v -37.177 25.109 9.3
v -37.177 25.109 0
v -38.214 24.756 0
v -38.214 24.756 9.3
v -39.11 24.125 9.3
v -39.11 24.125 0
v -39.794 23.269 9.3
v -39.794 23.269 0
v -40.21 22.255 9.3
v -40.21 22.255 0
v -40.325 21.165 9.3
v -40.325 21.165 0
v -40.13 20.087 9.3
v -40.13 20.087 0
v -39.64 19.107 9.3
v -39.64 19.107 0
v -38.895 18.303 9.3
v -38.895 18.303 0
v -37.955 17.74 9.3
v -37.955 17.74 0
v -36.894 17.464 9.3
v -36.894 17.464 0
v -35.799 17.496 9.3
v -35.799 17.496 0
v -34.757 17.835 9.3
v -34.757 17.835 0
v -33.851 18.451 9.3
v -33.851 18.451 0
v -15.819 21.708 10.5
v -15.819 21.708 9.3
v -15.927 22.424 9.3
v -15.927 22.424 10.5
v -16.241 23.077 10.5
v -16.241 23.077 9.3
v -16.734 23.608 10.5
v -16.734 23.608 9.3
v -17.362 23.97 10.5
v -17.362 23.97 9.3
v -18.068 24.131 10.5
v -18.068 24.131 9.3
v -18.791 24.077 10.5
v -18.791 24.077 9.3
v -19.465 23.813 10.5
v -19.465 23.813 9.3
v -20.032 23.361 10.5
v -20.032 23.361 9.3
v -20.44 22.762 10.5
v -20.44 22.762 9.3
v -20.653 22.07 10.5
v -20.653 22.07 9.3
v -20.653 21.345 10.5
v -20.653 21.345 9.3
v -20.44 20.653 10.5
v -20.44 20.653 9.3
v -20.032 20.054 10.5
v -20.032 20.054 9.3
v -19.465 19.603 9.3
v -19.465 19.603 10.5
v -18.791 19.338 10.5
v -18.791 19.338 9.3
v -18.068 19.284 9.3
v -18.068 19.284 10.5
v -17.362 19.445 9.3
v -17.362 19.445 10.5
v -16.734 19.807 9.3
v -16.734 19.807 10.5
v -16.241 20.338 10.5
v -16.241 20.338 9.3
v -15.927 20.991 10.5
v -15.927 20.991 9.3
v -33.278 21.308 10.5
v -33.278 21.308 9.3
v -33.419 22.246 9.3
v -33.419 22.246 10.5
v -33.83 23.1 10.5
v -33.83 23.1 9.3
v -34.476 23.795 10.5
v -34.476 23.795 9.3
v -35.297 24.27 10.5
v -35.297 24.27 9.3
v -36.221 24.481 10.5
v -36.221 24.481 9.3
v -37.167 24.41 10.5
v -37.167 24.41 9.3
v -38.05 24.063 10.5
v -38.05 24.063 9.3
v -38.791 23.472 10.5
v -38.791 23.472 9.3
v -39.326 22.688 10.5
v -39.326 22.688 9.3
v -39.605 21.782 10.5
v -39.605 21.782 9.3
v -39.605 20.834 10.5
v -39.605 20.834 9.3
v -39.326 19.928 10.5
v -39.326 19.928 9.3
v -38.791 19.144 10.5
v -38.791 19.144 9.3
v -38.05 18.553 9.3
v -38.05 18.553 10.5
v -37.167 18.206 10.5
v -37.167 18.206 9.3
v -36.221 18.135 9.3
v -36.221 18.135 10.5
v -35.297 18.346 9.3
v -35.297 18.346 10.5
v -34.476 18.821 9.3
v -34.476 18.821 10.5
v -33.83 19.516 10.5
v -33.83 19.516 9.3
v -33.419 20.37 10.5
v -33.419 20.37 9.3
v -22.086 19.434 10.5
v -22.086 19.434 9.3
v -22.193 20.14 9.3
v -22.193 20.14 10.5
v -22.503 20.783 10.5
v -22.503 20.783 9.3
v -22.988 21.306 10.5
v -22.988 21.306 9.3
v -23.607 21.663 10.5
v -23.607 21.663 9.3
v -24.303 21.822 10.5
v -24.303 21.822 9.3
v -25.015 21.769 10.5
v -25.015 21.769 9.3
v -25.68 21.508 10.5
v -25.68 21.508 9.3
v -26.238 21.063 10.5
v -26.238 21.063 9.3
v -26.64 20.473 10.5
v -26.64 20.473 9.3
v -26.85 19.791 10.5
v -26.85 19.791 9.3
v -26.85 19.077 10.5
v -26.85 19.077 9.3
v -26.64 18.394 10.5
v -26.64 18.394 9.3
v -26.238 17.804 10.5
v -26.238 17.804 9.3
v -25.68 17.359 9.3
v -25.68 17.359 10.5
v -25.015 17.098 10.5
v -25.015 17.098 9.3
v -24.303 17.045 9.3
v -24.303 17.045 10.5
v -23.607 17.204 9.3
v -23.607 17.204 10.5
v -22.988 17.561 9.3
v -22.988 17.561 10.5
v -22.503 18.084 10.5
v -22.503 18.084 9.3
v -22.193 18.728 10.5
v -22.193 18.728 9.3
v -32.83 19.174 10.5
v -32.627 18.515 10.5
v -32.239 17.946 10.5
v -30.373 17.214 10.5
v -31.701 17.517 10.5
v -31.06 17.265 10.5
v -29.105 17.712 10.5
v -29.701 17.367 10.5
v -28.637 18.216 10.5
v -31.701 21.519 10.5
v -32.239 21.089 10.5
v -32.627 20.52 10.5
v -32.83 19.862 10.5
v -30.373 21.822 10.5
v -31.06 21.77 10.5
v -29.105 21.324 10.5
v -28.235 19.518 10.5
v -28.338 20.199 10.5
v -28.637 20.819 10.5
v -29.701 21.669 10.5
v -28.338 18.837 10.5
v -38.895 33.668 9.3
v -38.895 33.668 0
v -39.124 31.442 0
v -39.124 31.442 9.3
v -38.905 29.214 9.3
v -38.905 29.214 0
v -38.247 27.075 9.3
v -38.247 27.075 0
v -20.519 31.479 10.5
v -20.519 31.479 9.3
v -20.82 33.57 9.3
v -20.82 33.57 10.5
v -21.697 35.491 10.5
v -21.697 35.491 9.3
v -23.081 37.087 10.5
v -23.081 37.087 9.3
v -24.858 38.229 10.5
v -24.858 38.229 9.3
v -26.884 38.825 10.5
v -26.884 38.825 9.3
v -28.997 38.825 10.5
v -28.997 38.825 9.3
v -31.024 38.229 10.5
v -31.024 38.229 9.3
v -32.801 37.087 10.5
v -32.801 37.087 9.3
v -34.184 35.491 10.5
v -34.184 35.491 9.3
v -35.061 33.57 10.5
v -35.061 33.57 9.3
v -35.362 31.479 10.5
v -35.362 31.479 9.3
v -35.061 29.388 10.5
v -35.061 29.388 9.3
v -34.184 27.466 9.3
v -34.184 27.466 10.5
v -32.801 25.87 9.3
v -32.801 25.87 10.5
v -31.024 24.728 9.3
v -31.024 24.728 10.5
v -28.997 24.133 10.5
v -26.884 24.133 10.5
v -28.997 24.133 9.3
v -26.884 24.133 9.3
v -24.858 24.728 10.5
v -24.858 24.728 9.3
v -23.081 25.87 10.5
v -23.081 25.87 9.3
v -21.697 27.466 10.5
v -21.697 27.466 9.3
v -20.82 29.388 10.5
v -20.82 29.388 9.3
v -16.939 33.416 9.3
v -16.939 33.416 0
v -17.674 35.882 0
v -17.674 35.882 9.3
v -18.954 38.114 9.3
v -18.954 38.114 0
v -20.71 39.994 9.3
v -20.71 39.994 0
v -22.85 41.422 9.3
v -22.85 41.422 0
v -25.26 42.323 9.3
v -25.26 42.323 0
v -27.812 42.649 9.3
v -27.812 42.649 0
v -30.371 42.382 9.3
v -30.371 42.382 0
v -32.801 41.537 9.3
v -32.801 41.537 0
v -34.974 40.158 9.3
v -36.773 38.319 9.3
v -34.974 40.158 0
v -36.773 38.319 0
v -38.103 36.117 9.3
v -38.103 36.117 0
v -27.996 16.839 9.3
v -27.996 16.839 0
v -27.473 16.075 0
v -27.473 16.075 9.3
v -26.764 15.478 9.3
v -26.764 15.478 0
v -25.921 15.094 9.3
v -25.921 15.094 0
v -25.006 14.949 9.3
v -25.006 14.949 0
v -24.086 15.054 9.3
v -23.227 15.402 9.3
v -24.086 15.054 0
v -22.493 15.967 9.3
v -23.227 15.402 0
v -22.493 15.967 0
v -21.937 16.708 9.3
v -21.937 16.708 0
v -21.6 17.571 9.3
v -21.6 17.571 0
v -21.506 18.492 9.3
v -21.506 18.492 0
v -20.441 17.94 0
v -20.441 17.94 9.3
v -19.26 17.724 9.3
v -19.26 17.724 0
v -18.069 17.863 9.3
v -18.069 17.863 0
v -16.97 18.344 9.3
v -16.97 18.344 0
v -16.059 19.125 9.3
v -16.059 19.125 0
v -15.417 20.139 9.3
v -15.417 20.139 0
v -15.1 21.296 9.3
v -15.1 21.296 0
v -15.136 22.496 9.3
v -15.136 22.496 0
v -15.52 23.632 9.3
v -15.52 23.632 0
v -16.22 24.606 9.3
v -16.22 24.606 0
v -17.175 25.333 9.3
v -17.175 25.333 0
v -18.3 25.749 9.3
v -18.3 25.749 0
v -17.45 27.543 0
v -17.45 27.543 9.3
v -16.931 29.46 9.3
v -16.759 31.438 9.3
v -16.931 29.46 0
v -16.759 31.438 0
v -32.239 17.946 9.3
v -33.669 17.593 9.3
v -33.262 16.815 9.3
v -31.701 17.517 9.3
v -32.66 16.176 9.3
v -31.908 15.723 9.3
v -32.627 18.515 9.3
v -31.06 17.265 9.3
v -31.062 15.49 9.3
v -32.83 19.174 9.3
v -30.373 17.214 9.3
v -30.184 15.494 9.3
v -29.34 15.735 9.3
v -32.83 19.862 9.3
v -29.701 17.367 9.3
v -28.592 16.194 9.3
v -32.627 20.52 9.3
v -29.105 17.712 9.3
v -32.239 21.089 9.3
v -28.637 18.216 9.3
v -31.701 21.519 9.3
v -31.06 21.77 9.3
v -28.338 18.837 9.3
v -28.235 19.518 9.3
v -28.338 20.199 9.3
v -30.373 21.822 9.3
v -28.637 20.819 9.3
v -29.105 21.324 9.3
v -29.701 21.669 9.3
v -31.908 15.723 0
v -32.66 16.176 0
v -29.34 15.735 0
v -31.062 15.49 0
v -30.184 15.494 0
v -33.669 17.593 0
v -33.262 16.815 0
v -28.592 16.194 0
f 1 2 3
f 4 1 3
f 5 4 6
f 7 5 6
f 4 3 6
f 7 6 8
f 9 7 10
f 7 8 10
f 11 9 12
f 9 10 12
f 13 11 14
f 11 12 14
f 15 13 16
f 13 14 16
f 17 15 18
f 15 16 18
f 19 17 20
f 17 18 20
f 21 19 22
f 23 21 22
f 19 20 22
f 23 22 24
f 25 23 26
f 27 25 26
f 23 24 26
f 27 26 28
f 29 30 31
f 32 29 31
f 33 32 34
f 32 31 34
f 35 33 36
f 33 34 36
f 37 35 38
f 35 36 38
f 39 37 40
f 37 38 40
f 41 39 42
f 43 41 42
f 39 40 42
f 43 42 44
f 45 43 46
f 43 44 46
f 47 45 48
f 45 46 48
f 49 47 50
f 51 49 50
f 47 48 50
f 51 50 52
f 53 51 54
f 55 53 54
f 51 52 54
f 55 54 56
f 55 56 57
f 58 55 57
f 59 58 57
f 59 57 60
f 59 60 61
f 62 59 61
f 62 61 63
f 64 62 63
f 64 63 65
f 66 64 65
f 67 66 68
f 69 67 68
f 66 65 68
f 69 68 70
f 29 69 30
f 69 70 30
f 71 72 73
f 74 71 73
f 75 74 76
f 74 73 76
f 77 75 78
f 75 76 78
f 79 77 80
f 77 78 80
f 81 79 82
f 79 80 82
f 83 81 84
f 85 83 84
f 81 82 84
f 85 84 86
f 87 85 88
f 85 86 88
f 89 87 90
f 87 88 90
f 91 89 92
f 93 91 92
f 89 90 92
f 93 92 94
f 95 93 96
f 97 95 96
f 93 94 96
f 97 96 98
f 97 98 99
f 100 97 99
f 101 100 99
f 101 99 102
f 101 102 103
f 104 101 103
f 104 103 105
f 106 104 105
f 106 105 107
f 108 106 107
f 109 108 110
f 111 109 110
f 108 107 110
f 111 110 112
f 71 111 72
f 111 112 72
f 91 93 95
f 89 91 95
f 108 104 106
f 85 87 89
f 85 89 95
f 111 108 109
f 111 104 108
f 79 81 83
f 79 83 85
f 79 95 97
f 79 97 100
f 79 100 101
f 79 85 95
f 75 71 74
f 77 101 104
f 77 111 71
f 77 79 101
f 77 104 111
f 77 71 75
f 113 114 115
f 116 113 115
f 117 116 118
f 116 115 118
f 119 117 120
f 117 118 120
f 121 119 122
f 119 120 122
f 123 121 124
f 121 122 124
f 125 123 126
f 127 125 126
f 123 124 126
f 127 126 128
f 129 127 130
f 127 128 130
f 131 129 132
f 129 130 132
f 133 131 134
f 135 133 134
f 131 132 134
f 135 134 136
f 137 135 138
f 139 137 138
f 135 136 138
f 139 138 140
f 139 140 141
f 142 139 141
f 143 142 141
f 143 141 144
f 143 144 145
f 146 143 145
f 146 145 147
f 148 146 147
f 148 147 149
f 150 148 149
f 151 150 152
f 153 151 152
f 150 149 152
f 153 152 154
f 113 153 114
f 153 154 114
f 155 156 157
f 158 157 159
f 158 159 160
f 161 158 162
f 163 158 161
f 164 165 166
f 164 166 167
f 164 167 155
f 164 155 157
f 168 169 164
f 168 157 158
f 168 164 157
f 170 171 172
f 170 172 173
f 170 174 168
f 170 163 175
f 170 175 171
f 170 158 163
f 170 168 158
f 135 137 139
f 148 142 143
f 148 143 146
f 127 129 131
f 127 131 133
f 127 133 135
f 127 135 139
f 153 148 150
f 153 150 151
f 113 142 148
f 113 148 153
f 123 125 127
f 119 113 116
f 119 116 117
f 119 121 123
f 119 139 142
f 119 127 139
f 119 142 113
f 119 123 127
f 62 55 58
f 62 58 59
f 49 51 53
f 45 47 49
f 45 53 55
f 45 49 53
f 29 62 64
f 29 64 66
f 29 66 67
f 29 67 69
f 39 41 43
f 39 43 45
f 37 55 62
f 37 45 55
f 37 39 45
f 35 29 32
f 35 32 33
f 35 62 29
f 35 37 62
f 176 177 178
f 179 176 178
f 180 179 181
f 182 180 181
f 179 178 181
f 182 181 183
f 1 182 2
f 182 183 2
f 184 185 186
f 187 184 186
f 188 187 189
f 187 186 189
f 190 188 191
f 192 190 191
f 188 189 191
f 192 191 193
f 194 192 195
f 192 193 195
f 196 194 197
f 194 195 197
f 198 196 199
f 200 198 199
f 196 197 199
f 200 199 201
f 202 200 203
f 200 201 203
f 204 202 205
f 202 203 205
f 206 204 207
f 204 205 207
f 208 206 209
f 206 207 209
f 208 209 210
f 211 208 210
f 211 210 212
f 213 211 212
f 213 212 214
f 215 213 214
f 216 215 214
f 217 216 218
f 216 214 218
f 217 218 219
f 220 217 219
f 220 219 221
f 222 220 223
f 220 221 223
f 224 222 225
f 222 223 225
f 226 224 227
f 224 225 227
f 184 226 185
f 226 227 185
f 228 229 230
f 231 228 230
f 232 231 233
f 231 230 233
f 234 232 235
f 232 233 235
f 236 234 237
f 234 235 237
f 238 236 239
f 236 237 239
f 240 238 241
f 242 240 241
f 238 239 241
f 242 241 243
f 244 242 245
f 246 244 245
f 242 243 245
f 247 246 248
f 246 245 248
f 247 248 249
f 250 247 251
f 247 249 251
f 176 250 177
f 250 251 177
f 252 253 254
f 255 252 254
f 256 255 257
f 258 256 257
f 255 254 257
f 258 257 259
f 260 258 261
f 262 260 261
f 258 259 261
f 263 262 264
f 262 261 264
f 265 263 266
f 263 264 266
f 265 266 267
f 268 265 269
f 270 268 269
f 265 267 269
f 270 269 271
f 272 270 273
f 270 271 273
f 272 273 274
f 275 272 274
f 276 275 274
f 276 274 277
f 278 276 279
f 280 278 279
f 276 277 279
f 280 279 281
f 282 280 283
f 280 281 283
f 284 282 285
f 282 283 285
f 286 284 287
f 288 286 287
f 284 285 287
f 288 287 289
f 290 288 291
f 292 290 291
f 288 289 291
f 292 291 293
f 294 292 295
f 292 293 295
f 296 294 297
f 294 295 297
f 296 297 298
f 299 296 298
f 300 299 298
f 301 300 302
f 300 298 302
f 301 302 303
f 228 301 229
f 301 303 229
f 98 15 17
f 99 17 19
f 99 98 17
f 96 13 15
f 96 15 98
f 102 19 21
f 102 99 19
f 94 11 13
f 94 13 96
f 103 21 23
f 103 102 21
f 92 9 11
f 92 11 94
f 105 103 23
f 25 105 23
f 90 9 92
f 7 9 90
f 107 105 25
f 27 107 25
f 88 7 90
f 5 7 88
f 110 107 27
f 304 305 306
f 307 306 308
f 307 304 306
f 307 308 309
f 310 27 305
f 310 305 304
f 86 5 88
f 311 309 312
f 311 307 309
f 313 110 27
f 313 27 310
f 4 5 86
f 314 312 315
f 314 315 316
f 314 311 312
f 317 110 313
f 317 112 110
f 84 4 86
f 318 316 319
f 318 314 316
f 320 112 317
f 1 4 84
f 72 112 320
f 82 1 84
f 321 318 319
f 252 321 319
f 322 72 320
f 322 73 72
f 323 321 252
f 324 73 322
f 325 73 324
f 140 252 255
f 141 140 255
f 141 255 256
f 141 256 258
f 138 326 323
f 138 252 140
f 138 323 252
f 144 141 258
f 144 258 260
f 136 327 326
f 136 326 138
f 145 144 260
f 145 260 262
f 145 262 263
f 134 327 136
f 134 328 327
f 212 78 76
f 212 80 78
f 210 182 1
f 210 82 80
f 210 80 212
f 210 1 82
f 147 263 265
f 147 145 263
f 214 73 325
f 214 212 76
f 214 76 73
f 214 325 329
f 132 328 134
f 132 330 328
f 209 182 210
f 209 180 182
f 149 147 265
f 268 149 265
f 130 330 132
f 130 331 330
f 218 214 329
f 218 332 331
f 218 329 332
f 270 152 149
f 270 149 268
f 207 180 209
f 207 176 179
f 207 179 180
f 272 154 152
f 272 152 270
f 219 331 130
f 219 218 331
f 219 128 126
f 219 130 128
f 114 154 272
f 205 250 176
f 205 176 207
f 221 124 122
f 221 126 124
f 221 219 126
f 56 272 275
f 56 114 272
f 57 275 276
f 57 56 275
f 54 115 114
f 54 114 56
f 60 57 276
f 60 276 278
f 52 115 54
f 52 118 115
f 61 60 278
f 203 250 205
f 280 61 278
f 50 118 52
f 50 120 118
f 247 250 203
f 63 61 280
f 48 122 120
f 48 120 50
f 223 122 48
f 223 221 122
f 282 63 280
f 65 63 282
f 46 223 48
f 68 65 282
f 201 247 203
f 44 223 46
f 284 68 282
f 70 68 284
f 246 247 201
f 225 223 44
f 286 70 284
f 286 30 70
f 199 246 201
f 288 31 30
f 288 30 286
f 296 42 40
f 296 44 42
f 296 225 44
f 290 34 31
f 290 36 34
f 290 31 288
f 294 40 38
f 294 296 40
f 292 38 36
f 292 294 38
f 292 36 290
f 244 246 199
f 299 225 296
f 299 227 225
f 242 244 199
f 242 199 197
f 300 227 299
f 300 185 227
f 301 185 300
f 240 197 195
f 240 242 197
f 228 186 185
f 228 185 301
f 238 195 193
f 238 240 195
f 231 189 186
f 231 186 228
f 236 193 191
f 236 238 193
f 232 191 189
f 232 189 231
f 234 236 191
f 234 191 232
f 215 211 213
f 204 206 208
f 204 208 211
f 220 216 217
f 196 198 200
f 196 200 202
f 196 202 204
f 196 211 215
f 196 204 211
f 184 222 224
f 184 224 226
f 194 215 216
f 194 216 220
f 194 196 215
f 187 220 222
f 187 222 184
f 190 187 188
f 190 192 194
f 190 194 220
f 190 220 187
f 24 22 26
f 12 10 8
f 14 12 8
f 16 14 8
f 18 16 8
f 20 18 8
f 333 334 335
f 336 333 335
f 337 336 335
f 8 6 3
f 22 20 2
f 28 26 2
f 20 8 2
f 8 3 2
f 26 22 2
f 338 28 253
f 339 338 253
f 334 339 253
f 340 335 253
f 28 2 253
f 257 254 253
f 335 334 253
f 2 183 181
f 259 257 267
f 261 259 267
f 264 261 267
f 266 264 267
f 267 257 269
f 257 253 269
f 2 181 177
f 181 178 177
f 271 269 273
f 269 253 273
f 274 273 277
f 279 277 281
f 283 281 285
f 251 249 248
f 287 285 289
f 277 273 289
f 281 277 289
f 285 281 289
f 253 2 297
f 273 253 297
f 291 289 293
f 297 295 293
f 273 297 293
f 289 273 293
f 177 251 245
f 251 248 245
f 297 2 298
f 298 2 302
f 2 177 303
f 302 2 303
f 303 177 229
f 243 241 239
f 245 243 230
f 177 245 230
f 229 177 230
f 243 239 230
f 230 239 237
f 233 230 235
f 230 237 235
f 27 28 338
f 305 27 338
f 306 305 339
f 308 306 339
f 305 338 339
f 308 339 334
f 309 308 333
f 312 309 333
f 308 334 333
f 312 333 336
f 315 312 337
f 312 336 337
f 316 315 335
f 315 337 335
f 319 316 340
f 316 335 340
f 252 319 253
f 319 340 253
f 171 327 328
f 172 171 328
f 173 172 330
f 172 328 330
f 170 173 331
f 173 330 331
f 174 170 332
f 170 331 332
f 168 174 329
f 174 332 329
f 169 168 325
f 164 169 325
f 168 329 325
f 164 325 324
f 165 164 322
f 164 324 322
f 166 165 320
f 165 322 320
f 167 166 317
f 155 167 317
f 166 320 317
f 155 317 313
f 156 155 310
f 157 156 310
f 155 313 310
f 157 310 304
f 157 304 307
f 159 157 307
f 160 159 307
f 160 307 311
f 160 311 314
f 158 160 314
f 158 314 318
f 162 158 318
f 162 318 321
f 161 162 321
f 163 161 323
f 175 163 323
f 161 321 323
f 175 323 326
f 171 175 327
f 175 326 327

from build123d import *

# Parameters (mm, degrees)
F1_DEPTH = 9.3
F2_R     = 7.4213549333
F2_R_2   = 3.1815358487
F2_R_3   = 2.3103538903
F2_R_4   = 2.3953978144
F2_R_5   = 2.4306675127
F3_DEPTH = 1.2


with BuildPart() as f1:
    # F0 (on Top) → F1 (new body)
    with BuildSketch(Plane.XY):
        with BuildLine():
            ThreePointArc((-18.3004729587, 25.7488646483), (-16.9307669757, 29.4600974462), (-16.9389080256, 33.4160141647))
            ThreePointArc((-16.9389080256, 33.4160141647), (-27.8122380676, 42.6489766388), (-38.8949178159, 33.6683802307))
            ThreePointArc((-38.8949178159, 33.6683802307), (-38.9054329765, 29.2141712974), (-37.1765067827, 25.1091862783))
            ThreePointArc((-37.1765067827, 25.1091862783), (-35.1477566437, 22.8641370486), (-32.5913859219, 21.2451738298))
            ThreePointArc((-32.5913859219, 21.2451738298), (-30.2580300956, 20.4751404155), (-27.8128294464, 20.2332837294))
            ThreePointArc((-27.8128294464, 20.2332837294), (-25.4265044225, 20.5189898006), (-23.1563369345, 21.3079857798))
            ThreePointArc((-23.1563369345, 21.3079857798), (-20.3943690235, 23.1631747639), (-18.3004729587, 25.7488646483))
        make_face()
        with BuildLine():
            ThreePointArc((-21.5058938379, 18.49241862), (-15.4174244879, 20.1391282026), (-18.3004729587, 25.7488646483))
            ThreePointArc((-18.3004729587, 25.7488646483), (-20.3943690235, 23.1631747639), (-23.1563369345, 21.3079857798))
            ThreePointArc((-23.1563369345, 21.3079857798), (-21.9745400177, 20.1092213147), (-21.5058938379, 18.49241862))
        make_face()
        with BuildLine():
            ThreePointArc((-32.5913859219, 21.2451738298), (-35.1477566437, 22.8641370486), (-37.1765067827, 25.1091862783))
            ThreePointArc((-37.1765067827, 25.1091862783), (-39.9197400879, 19.57935889), (-33.8508013782, 18.4513948615))
            ThreePointArc((-33.8508013782, 18.4513948615), (-33.5745375326, 20.0076143047), (-32.5913859219, 21.2451738298))
        make_face()
        with BuildLine():
            ThreePointArc((-21.5058938379, 18.49241862), (-22.6267961898, 19.7268785626), (-23.1563369345, 21.3079857798))
            ThreePointArc((-23.1563369345, 21.3079857798), (-25.4265044225, 20.5189898006), (-27.8128294464, 20.2332837294))
            ThreePointArc((-27.8128294464, 20.2332837294), (-27.4203125791, 18.5099777966), (-27.9959938241, 16.8389170756))
            ThreePointArc((-27.9959938241, 16.8389170756), (-24.0855301415, 15.0538762887), (-21.5058938379, 18.49241862))
        make_face()
        with BuildLine():
            ThreePointArc((-21.5058938379, 18.49241862), (-21.9745400177, 20.1092213147), (-23.1563369345, 21.3079857798))
            ThreePointArc((-23.1563369345, 21.3079857798), (-22.6267961898, 19.7268785626), (-21.5058938379, 18.49241862))
        make_face()
        with BuildLine():
            ThreePointArc((-27.8128294464, 20.2332837294), (-30.2580300956, 20.4751404155), (-32.5913859219, 21.2451738298))
            ThreePointArc((-32.5913859219, 21.2451738298), (-32.932636463, 19.7182499213), (-33.8508013782, 18.4513948615))
            ThreePointArc((-33.8508013782, 18.4513948615), (-31.4928658765, 15.5774517251), (-27.9959938241, 16.8389170756))
            ThreePointArc((-27.9959938241, 16.8389170756), (-28.3547938845, 18.5604036062), (-27.8128294464, 20.2332837294))
        make_face()
        with BuildLine():
            ThreePointArc((-33.8508013782, 18.4513948615), (-32.932636463, 19.7182499213), (-32.5913859219, 21.2451738298))
            ThreePointArc((-32.5913859219, 21.2451738298), (-33.5745375326, 20.0076143047), (-33.8508013782, 18.4513948615))
        make_face()
        with BuildLine():
            ThreePointArc((-27.9959938241, 16.8389170756), (-27.4203125791, 18.5099777966), (-27.8128294464, 20.2332837294))
            ThreePointArc((-27.8128294464, 20.2332837294), (-28.3547938845, 18.5604036062), (-27.9959938241, 16.8389170756))
        make_face()
    extrude(amount=F1_DEPTH)

    # F2 (on face) → F3 (join)
    with BuildSketch(Plane.XY.offset(9.3)):
        with Locations((-27.9406308089, 31.4787256965)):
            Circle(F2_R)
        with Locations((-36.4591698118, 21.3079857798)):
            Circle(F2_R_2)
        with Locations((-30.5455215275, 19.5178873837)):
            Circle(F2_R_3)
        with Locations((-24.4818478823, 19.4336697459)):
            Circle(F2_R_4)
        with Locations((-18.2497408241, 21.7075478286)):
            Circle(F2_R_5)
    extrude(amount=F3_DEPTH)


solid = f1.part
